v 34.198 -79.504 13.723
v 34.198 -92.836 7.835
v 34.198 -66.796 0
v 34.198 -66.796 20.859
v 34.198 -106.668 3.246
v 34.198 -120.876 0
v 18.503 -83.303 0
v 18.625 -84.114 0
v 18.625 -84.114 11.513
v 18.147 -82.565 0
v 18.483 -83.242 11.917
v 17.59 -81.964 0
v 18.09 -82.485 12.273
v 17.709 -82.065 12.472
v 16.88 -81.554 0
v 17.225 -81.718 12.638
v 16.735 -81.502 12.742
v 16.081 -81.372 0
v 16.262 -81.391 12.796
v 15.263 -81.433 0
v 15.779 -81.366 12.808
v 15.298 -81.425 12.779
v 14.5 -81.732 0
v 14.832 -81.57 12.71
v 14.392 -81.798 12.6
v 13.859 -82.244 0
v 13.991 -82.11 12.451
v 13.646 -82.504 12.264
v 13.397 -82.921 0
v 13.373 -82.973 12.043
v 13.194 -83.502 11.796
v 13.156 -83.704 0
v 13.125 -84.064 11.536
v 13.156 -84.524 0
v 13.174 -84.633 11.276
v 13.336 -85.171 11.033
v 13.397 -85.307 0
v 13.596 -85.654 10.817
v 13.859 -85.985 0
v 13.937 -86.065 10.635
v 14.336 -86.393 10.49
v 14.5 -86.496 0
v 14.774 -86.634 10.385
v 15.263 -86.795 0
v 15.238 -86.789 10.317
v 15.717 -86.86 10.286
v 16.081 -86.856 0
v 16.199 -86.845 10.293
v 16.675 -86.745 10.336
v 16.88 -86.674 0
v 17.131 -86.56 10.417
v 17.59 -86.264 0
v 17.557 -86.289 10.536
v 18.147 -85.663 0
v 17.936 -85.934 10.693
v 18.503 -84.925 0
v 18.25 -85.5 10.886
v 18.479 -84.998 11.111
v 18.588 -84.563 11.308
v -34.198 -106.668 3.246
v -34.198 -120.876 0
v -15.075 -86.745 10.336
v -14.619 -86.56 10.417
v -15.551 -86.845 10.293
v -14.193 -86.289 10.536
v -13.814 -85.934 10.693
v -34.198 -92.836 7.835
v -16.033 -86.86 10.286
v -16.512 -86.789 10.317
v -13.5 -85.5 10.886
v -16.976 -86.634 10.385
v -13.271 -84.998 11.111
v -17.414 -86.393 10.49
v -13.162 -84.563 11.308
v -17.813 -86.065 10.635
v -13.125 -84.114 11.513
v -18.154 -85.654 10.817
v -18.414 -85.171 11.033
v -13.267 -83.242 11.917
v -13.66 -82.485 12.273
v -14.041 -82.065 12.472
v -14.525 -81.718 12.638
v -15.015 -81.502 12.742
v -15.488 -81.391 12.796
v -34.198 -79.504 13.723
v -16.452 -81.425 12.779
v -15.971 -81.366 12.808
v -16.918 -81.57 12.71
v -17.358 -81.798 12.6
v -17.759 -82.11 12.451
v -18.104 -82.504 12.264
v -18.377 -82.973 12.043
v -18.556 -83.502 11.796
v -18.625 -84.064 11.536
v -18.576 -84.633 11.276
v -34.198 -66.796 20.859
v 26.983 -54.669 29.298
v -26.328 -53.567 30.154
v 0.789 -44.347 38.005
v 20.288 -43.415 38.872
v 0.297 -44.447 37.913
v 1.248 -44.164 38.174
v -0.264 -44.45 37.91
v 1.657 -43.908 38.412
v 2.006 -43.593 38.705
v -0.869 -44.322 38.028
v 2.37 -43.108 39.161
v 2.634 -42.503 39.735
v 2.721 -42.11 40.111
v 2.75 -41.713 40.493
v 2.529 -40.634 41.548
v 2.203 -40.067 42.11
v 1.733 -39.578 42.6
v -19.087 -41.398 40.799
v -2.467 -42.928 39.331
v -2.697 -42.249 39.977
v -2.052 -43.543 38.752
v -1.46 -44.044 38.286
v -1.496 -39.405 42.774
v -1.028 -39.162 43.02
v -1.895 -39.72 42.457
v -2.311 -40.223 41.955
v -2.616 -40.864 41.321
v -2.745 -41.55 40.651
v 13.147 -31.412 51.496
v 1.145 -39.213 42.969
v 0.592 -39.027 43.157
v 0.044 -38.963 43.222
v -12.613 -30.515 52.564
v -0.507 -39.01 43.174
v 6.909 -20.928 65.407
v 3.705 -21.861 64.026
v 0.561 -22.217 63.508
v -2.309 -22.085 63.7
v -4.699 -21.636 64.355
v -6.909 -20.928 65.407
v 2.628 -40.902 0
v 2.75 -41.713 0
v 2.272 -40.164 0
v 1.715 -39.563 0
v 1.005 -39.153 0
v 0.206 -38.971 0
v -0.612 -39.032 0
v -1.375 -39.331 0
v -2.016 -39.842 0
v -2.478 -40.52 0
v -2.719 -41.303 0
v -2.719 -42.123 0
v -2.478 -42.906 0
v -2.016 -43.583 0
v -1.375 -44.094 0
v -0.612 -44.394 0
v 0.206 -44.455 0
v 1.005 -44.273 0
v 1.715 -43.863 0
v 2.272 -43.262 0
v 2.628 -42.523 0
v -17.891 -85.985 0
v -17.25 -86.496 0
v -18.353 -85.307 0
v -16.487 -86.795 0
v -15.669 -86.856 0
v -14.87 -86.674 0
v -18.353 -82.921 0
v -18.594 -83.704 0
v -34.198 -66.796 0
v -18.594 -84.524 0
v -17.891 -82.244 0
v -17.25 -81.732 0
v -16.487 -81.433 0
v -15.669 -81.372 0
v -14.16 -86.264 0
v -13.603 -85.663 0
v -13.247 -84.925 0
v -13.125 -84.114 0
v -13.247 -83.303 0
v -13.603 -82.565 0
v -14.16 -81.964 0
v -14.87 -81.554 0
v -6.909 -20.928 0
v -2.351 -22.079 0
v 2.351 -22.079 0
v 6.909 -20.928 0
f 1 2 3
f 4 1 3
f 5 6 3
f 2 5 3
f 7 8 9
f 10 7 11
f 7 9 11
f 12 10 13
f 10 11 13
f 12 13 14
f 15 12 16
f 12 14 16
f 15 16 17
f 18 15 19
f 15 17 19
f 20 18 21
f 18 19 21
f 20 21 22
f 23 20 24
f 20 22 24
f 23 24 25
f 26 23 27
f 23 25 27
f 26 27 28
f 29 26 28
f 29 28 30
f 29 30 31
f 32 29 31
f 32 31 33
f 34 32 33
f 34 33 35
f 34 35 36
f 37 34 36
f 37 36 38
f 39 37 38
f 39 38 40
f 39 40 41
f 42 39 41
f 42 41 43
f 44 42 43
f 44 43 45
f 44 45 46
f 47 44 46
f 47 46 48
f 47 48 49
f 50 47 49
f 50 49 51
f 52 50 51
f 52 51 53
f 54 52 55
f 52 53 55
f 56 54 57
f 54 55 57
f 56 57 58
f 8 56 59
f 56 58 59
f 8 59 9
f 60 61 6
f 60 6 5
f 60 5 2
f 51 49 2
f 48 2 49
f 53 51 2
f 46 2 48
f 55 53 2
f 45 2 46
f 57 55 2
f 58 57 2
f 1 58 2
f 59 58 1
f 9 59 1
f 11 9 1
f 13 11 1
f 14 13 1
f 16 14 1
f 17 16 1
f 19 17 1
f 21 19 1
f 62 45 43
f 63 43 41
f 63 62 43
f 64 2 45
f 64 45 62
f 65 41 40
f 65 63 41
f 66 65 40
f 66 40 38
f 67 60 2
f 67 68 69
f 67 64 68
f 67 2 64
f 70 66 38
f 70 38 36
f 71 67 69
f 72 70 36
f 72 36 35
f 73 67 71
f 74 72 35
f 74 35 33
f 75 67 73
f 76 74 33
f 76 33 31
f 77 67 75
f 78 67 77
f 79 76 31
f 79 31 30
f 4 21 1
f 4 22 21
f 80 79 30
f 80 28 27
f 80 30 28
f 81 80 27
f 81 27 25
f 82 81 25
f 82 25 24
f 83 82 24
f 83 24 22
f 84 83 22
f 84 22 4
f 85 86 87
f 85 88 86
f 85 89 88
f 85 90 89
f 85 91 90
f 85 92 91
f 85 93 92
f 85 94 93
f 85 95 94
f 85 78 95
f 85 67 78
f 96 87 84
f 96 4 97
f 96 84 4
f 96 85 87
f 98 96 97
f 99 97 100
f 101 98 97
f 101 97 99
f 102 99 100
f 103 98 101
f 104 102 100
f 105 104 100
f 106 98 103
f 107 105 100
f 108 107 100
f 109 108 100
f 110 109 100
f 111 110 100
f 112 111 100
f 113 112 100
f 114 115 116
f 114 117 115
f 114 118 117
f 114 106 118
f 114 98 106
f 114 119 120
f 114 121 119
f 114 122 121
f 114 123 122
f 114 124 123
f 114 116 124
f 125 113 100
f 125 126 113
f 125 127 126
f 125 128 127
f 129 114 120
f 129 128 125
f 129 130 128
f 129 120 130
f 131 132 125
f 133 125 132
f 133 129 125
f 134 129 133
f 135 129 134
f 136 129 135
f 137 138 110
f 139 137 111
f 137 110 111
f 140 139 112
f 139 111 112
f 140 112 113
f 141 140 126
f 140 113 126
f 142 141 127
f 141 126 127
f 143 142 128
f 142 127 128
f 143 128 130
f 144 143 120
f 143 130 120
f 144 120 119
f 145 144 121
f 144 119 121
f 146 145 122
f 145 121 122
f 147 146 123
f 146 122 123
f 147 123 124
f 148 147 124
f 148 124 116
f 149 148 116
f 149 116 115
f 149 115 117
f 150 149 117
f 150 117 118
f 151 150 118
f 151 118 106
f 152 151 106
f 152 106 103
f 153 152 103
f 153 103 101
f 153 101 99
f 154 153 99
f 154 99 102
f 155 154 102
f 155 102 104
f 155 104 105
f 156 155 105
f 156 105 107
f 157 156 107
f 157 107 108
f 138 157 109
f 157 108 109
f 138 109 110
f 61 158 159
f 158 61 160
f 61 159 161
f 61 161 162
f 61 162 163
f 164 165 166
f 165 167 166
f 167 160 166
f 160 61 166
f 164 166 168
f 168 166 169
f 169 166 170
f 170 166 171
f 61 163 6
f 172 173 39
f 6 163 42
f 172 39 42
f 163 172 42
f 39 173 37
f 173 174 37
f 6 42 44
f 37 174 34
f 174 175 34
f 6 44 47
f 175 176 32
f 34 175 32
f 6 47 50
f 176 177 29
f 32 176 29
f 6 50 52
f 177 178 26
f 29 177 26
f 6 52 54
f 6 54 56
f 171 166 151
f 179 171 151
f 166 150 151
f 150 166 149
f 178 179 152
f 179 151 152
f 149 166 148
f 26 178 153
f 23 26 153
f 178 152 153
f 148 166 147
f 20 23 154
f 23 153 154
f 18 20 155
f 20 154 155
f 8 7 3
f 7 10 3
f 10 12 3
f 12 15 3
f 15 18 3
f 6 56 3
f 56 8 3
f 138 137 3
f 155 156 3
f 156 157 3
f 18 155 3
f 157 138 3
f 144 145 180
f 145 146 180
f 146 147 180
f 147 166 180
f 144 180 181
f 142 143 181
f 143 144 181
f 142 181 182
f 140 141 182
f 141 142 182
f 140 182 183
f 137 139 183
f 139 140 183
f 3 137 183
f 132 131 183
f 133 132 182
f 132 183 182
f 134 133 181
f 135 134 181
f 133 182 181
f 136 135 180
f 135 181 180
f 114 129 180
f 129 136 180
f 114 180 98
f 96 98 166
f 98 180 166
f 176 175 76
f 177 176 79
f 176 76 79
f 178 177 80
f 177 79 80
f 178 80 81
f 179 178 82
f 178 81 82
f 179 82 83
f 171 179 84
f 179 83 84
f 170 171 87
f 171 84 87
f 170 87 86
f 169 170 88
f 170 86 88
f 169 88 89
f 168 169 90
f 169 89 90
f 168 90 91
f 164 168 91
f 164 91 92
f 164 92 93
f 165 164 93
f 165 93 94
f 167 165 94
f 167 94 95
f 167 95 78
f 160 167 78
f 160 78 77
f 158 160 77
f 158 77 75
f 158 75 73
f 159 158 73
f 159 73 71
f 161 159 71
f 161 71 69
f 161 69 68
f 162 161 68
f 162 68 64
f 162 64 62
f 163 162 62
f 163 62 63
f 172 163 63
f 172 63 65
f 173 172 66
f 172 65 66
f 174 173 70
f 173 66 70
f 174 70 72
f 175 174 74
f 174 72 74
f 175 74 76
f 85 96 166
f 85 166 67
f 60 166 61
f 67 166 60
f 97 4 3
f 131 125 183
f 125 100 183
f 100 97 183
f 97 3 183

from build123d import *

# Parameters (mm, degrees)
BOSS_EXTRUDE1_DEPTH  = 76.2
CUT_EXTRUDE1_START   = -34.198033
CUT_EXTRUDE1_DEPTH   = 68.396066318
M5_CLEARANCE_HOLE1_D = 5.5
CUT_EXTRUDE2_REACH   = 144.97
SKETCH10_R           = 19.05


with BuildPart() as part:
    # Sketch1 → Boss-Extrude1 (new body)
    with BuildSketch(Plane.XY):
        Polygon((34.198033159, -120.876287401), (34.198033159, -66.796344186), (0, -9.314618425), (-34.198033159, -66.796344186), (-34.198033159, -120.876287401), align=None)
    extrude(amount=BOSS_EXTRUDE1_DEPTH)

    # Sketch2 → Cut-Extrude1 (cut)
    with BuildSketch(Plane(origin=(0, 0, 0), x_dir=(0, 0, -1), z_dir=(1, 0, 0)).offset(CUT_EXTRUDE1_START)):
        with BuildLine():
            Line((-76.2, -120.876287401), (0, -120.876287401))
            ThreePointArc((0, -120.876287401), (-23.444492551, -62.806448146), (-68.2625, -19.067487592))
            Line((-68.2625, -19.067487592), (-68.2625, -9.314618425))
            Line((-68.2625, -9.314618425), (-76.2, -9.314618425))
            Line((-76.2, -9.314618425), (-76.2, -22.225))
            Line((-76.2, -22.225), (-76.2, -66.796344186))
            Line((-76.2, -66.796344186), (-76.2, -120.876287401))
        make_face()
    extrude(amount=CUT_EXTRUDE1_DEPTH, mode=Mode.SUBTRACT)

    # M5 Clearance Hole1 (through all)
    with Locations(Plane(origin=(0, 0, 0), x_dir=(-1, 0, 0), z_dir=(0, 0, -1))):
        with Locations((-15.875, -84.114050529), (15.875, -84.114050529), (0, -41.712872808)):
            Hole(M5_CLEARANCE_HOLE1_D / 2)

    # Sketch10 → Cut-Extrude2 (cut, up to next)
    with BuildSketch(Plane(origin=(0, 0, 0), x_dir=(-1, 0, 0), z_dir=(0, 0, -1)), mode=Mode.PRIVATE) as cut_extrude2_sk1:
        with Locations((0, -3.175)):
            Circle(SKETCH10_R)
    cut_extrude2_tool1 = extrude(cut_extrude2_sk1.sketch, amount=-CUT_EXTRUDE2_REACH, mode=Mode.PRIVATE) & part.part
    add(cut_extrude2_tool1.solids().sort_by_distance((0, -3.175, 0))[0], mode=Mode.SUBTRACT)


solid = part.part
